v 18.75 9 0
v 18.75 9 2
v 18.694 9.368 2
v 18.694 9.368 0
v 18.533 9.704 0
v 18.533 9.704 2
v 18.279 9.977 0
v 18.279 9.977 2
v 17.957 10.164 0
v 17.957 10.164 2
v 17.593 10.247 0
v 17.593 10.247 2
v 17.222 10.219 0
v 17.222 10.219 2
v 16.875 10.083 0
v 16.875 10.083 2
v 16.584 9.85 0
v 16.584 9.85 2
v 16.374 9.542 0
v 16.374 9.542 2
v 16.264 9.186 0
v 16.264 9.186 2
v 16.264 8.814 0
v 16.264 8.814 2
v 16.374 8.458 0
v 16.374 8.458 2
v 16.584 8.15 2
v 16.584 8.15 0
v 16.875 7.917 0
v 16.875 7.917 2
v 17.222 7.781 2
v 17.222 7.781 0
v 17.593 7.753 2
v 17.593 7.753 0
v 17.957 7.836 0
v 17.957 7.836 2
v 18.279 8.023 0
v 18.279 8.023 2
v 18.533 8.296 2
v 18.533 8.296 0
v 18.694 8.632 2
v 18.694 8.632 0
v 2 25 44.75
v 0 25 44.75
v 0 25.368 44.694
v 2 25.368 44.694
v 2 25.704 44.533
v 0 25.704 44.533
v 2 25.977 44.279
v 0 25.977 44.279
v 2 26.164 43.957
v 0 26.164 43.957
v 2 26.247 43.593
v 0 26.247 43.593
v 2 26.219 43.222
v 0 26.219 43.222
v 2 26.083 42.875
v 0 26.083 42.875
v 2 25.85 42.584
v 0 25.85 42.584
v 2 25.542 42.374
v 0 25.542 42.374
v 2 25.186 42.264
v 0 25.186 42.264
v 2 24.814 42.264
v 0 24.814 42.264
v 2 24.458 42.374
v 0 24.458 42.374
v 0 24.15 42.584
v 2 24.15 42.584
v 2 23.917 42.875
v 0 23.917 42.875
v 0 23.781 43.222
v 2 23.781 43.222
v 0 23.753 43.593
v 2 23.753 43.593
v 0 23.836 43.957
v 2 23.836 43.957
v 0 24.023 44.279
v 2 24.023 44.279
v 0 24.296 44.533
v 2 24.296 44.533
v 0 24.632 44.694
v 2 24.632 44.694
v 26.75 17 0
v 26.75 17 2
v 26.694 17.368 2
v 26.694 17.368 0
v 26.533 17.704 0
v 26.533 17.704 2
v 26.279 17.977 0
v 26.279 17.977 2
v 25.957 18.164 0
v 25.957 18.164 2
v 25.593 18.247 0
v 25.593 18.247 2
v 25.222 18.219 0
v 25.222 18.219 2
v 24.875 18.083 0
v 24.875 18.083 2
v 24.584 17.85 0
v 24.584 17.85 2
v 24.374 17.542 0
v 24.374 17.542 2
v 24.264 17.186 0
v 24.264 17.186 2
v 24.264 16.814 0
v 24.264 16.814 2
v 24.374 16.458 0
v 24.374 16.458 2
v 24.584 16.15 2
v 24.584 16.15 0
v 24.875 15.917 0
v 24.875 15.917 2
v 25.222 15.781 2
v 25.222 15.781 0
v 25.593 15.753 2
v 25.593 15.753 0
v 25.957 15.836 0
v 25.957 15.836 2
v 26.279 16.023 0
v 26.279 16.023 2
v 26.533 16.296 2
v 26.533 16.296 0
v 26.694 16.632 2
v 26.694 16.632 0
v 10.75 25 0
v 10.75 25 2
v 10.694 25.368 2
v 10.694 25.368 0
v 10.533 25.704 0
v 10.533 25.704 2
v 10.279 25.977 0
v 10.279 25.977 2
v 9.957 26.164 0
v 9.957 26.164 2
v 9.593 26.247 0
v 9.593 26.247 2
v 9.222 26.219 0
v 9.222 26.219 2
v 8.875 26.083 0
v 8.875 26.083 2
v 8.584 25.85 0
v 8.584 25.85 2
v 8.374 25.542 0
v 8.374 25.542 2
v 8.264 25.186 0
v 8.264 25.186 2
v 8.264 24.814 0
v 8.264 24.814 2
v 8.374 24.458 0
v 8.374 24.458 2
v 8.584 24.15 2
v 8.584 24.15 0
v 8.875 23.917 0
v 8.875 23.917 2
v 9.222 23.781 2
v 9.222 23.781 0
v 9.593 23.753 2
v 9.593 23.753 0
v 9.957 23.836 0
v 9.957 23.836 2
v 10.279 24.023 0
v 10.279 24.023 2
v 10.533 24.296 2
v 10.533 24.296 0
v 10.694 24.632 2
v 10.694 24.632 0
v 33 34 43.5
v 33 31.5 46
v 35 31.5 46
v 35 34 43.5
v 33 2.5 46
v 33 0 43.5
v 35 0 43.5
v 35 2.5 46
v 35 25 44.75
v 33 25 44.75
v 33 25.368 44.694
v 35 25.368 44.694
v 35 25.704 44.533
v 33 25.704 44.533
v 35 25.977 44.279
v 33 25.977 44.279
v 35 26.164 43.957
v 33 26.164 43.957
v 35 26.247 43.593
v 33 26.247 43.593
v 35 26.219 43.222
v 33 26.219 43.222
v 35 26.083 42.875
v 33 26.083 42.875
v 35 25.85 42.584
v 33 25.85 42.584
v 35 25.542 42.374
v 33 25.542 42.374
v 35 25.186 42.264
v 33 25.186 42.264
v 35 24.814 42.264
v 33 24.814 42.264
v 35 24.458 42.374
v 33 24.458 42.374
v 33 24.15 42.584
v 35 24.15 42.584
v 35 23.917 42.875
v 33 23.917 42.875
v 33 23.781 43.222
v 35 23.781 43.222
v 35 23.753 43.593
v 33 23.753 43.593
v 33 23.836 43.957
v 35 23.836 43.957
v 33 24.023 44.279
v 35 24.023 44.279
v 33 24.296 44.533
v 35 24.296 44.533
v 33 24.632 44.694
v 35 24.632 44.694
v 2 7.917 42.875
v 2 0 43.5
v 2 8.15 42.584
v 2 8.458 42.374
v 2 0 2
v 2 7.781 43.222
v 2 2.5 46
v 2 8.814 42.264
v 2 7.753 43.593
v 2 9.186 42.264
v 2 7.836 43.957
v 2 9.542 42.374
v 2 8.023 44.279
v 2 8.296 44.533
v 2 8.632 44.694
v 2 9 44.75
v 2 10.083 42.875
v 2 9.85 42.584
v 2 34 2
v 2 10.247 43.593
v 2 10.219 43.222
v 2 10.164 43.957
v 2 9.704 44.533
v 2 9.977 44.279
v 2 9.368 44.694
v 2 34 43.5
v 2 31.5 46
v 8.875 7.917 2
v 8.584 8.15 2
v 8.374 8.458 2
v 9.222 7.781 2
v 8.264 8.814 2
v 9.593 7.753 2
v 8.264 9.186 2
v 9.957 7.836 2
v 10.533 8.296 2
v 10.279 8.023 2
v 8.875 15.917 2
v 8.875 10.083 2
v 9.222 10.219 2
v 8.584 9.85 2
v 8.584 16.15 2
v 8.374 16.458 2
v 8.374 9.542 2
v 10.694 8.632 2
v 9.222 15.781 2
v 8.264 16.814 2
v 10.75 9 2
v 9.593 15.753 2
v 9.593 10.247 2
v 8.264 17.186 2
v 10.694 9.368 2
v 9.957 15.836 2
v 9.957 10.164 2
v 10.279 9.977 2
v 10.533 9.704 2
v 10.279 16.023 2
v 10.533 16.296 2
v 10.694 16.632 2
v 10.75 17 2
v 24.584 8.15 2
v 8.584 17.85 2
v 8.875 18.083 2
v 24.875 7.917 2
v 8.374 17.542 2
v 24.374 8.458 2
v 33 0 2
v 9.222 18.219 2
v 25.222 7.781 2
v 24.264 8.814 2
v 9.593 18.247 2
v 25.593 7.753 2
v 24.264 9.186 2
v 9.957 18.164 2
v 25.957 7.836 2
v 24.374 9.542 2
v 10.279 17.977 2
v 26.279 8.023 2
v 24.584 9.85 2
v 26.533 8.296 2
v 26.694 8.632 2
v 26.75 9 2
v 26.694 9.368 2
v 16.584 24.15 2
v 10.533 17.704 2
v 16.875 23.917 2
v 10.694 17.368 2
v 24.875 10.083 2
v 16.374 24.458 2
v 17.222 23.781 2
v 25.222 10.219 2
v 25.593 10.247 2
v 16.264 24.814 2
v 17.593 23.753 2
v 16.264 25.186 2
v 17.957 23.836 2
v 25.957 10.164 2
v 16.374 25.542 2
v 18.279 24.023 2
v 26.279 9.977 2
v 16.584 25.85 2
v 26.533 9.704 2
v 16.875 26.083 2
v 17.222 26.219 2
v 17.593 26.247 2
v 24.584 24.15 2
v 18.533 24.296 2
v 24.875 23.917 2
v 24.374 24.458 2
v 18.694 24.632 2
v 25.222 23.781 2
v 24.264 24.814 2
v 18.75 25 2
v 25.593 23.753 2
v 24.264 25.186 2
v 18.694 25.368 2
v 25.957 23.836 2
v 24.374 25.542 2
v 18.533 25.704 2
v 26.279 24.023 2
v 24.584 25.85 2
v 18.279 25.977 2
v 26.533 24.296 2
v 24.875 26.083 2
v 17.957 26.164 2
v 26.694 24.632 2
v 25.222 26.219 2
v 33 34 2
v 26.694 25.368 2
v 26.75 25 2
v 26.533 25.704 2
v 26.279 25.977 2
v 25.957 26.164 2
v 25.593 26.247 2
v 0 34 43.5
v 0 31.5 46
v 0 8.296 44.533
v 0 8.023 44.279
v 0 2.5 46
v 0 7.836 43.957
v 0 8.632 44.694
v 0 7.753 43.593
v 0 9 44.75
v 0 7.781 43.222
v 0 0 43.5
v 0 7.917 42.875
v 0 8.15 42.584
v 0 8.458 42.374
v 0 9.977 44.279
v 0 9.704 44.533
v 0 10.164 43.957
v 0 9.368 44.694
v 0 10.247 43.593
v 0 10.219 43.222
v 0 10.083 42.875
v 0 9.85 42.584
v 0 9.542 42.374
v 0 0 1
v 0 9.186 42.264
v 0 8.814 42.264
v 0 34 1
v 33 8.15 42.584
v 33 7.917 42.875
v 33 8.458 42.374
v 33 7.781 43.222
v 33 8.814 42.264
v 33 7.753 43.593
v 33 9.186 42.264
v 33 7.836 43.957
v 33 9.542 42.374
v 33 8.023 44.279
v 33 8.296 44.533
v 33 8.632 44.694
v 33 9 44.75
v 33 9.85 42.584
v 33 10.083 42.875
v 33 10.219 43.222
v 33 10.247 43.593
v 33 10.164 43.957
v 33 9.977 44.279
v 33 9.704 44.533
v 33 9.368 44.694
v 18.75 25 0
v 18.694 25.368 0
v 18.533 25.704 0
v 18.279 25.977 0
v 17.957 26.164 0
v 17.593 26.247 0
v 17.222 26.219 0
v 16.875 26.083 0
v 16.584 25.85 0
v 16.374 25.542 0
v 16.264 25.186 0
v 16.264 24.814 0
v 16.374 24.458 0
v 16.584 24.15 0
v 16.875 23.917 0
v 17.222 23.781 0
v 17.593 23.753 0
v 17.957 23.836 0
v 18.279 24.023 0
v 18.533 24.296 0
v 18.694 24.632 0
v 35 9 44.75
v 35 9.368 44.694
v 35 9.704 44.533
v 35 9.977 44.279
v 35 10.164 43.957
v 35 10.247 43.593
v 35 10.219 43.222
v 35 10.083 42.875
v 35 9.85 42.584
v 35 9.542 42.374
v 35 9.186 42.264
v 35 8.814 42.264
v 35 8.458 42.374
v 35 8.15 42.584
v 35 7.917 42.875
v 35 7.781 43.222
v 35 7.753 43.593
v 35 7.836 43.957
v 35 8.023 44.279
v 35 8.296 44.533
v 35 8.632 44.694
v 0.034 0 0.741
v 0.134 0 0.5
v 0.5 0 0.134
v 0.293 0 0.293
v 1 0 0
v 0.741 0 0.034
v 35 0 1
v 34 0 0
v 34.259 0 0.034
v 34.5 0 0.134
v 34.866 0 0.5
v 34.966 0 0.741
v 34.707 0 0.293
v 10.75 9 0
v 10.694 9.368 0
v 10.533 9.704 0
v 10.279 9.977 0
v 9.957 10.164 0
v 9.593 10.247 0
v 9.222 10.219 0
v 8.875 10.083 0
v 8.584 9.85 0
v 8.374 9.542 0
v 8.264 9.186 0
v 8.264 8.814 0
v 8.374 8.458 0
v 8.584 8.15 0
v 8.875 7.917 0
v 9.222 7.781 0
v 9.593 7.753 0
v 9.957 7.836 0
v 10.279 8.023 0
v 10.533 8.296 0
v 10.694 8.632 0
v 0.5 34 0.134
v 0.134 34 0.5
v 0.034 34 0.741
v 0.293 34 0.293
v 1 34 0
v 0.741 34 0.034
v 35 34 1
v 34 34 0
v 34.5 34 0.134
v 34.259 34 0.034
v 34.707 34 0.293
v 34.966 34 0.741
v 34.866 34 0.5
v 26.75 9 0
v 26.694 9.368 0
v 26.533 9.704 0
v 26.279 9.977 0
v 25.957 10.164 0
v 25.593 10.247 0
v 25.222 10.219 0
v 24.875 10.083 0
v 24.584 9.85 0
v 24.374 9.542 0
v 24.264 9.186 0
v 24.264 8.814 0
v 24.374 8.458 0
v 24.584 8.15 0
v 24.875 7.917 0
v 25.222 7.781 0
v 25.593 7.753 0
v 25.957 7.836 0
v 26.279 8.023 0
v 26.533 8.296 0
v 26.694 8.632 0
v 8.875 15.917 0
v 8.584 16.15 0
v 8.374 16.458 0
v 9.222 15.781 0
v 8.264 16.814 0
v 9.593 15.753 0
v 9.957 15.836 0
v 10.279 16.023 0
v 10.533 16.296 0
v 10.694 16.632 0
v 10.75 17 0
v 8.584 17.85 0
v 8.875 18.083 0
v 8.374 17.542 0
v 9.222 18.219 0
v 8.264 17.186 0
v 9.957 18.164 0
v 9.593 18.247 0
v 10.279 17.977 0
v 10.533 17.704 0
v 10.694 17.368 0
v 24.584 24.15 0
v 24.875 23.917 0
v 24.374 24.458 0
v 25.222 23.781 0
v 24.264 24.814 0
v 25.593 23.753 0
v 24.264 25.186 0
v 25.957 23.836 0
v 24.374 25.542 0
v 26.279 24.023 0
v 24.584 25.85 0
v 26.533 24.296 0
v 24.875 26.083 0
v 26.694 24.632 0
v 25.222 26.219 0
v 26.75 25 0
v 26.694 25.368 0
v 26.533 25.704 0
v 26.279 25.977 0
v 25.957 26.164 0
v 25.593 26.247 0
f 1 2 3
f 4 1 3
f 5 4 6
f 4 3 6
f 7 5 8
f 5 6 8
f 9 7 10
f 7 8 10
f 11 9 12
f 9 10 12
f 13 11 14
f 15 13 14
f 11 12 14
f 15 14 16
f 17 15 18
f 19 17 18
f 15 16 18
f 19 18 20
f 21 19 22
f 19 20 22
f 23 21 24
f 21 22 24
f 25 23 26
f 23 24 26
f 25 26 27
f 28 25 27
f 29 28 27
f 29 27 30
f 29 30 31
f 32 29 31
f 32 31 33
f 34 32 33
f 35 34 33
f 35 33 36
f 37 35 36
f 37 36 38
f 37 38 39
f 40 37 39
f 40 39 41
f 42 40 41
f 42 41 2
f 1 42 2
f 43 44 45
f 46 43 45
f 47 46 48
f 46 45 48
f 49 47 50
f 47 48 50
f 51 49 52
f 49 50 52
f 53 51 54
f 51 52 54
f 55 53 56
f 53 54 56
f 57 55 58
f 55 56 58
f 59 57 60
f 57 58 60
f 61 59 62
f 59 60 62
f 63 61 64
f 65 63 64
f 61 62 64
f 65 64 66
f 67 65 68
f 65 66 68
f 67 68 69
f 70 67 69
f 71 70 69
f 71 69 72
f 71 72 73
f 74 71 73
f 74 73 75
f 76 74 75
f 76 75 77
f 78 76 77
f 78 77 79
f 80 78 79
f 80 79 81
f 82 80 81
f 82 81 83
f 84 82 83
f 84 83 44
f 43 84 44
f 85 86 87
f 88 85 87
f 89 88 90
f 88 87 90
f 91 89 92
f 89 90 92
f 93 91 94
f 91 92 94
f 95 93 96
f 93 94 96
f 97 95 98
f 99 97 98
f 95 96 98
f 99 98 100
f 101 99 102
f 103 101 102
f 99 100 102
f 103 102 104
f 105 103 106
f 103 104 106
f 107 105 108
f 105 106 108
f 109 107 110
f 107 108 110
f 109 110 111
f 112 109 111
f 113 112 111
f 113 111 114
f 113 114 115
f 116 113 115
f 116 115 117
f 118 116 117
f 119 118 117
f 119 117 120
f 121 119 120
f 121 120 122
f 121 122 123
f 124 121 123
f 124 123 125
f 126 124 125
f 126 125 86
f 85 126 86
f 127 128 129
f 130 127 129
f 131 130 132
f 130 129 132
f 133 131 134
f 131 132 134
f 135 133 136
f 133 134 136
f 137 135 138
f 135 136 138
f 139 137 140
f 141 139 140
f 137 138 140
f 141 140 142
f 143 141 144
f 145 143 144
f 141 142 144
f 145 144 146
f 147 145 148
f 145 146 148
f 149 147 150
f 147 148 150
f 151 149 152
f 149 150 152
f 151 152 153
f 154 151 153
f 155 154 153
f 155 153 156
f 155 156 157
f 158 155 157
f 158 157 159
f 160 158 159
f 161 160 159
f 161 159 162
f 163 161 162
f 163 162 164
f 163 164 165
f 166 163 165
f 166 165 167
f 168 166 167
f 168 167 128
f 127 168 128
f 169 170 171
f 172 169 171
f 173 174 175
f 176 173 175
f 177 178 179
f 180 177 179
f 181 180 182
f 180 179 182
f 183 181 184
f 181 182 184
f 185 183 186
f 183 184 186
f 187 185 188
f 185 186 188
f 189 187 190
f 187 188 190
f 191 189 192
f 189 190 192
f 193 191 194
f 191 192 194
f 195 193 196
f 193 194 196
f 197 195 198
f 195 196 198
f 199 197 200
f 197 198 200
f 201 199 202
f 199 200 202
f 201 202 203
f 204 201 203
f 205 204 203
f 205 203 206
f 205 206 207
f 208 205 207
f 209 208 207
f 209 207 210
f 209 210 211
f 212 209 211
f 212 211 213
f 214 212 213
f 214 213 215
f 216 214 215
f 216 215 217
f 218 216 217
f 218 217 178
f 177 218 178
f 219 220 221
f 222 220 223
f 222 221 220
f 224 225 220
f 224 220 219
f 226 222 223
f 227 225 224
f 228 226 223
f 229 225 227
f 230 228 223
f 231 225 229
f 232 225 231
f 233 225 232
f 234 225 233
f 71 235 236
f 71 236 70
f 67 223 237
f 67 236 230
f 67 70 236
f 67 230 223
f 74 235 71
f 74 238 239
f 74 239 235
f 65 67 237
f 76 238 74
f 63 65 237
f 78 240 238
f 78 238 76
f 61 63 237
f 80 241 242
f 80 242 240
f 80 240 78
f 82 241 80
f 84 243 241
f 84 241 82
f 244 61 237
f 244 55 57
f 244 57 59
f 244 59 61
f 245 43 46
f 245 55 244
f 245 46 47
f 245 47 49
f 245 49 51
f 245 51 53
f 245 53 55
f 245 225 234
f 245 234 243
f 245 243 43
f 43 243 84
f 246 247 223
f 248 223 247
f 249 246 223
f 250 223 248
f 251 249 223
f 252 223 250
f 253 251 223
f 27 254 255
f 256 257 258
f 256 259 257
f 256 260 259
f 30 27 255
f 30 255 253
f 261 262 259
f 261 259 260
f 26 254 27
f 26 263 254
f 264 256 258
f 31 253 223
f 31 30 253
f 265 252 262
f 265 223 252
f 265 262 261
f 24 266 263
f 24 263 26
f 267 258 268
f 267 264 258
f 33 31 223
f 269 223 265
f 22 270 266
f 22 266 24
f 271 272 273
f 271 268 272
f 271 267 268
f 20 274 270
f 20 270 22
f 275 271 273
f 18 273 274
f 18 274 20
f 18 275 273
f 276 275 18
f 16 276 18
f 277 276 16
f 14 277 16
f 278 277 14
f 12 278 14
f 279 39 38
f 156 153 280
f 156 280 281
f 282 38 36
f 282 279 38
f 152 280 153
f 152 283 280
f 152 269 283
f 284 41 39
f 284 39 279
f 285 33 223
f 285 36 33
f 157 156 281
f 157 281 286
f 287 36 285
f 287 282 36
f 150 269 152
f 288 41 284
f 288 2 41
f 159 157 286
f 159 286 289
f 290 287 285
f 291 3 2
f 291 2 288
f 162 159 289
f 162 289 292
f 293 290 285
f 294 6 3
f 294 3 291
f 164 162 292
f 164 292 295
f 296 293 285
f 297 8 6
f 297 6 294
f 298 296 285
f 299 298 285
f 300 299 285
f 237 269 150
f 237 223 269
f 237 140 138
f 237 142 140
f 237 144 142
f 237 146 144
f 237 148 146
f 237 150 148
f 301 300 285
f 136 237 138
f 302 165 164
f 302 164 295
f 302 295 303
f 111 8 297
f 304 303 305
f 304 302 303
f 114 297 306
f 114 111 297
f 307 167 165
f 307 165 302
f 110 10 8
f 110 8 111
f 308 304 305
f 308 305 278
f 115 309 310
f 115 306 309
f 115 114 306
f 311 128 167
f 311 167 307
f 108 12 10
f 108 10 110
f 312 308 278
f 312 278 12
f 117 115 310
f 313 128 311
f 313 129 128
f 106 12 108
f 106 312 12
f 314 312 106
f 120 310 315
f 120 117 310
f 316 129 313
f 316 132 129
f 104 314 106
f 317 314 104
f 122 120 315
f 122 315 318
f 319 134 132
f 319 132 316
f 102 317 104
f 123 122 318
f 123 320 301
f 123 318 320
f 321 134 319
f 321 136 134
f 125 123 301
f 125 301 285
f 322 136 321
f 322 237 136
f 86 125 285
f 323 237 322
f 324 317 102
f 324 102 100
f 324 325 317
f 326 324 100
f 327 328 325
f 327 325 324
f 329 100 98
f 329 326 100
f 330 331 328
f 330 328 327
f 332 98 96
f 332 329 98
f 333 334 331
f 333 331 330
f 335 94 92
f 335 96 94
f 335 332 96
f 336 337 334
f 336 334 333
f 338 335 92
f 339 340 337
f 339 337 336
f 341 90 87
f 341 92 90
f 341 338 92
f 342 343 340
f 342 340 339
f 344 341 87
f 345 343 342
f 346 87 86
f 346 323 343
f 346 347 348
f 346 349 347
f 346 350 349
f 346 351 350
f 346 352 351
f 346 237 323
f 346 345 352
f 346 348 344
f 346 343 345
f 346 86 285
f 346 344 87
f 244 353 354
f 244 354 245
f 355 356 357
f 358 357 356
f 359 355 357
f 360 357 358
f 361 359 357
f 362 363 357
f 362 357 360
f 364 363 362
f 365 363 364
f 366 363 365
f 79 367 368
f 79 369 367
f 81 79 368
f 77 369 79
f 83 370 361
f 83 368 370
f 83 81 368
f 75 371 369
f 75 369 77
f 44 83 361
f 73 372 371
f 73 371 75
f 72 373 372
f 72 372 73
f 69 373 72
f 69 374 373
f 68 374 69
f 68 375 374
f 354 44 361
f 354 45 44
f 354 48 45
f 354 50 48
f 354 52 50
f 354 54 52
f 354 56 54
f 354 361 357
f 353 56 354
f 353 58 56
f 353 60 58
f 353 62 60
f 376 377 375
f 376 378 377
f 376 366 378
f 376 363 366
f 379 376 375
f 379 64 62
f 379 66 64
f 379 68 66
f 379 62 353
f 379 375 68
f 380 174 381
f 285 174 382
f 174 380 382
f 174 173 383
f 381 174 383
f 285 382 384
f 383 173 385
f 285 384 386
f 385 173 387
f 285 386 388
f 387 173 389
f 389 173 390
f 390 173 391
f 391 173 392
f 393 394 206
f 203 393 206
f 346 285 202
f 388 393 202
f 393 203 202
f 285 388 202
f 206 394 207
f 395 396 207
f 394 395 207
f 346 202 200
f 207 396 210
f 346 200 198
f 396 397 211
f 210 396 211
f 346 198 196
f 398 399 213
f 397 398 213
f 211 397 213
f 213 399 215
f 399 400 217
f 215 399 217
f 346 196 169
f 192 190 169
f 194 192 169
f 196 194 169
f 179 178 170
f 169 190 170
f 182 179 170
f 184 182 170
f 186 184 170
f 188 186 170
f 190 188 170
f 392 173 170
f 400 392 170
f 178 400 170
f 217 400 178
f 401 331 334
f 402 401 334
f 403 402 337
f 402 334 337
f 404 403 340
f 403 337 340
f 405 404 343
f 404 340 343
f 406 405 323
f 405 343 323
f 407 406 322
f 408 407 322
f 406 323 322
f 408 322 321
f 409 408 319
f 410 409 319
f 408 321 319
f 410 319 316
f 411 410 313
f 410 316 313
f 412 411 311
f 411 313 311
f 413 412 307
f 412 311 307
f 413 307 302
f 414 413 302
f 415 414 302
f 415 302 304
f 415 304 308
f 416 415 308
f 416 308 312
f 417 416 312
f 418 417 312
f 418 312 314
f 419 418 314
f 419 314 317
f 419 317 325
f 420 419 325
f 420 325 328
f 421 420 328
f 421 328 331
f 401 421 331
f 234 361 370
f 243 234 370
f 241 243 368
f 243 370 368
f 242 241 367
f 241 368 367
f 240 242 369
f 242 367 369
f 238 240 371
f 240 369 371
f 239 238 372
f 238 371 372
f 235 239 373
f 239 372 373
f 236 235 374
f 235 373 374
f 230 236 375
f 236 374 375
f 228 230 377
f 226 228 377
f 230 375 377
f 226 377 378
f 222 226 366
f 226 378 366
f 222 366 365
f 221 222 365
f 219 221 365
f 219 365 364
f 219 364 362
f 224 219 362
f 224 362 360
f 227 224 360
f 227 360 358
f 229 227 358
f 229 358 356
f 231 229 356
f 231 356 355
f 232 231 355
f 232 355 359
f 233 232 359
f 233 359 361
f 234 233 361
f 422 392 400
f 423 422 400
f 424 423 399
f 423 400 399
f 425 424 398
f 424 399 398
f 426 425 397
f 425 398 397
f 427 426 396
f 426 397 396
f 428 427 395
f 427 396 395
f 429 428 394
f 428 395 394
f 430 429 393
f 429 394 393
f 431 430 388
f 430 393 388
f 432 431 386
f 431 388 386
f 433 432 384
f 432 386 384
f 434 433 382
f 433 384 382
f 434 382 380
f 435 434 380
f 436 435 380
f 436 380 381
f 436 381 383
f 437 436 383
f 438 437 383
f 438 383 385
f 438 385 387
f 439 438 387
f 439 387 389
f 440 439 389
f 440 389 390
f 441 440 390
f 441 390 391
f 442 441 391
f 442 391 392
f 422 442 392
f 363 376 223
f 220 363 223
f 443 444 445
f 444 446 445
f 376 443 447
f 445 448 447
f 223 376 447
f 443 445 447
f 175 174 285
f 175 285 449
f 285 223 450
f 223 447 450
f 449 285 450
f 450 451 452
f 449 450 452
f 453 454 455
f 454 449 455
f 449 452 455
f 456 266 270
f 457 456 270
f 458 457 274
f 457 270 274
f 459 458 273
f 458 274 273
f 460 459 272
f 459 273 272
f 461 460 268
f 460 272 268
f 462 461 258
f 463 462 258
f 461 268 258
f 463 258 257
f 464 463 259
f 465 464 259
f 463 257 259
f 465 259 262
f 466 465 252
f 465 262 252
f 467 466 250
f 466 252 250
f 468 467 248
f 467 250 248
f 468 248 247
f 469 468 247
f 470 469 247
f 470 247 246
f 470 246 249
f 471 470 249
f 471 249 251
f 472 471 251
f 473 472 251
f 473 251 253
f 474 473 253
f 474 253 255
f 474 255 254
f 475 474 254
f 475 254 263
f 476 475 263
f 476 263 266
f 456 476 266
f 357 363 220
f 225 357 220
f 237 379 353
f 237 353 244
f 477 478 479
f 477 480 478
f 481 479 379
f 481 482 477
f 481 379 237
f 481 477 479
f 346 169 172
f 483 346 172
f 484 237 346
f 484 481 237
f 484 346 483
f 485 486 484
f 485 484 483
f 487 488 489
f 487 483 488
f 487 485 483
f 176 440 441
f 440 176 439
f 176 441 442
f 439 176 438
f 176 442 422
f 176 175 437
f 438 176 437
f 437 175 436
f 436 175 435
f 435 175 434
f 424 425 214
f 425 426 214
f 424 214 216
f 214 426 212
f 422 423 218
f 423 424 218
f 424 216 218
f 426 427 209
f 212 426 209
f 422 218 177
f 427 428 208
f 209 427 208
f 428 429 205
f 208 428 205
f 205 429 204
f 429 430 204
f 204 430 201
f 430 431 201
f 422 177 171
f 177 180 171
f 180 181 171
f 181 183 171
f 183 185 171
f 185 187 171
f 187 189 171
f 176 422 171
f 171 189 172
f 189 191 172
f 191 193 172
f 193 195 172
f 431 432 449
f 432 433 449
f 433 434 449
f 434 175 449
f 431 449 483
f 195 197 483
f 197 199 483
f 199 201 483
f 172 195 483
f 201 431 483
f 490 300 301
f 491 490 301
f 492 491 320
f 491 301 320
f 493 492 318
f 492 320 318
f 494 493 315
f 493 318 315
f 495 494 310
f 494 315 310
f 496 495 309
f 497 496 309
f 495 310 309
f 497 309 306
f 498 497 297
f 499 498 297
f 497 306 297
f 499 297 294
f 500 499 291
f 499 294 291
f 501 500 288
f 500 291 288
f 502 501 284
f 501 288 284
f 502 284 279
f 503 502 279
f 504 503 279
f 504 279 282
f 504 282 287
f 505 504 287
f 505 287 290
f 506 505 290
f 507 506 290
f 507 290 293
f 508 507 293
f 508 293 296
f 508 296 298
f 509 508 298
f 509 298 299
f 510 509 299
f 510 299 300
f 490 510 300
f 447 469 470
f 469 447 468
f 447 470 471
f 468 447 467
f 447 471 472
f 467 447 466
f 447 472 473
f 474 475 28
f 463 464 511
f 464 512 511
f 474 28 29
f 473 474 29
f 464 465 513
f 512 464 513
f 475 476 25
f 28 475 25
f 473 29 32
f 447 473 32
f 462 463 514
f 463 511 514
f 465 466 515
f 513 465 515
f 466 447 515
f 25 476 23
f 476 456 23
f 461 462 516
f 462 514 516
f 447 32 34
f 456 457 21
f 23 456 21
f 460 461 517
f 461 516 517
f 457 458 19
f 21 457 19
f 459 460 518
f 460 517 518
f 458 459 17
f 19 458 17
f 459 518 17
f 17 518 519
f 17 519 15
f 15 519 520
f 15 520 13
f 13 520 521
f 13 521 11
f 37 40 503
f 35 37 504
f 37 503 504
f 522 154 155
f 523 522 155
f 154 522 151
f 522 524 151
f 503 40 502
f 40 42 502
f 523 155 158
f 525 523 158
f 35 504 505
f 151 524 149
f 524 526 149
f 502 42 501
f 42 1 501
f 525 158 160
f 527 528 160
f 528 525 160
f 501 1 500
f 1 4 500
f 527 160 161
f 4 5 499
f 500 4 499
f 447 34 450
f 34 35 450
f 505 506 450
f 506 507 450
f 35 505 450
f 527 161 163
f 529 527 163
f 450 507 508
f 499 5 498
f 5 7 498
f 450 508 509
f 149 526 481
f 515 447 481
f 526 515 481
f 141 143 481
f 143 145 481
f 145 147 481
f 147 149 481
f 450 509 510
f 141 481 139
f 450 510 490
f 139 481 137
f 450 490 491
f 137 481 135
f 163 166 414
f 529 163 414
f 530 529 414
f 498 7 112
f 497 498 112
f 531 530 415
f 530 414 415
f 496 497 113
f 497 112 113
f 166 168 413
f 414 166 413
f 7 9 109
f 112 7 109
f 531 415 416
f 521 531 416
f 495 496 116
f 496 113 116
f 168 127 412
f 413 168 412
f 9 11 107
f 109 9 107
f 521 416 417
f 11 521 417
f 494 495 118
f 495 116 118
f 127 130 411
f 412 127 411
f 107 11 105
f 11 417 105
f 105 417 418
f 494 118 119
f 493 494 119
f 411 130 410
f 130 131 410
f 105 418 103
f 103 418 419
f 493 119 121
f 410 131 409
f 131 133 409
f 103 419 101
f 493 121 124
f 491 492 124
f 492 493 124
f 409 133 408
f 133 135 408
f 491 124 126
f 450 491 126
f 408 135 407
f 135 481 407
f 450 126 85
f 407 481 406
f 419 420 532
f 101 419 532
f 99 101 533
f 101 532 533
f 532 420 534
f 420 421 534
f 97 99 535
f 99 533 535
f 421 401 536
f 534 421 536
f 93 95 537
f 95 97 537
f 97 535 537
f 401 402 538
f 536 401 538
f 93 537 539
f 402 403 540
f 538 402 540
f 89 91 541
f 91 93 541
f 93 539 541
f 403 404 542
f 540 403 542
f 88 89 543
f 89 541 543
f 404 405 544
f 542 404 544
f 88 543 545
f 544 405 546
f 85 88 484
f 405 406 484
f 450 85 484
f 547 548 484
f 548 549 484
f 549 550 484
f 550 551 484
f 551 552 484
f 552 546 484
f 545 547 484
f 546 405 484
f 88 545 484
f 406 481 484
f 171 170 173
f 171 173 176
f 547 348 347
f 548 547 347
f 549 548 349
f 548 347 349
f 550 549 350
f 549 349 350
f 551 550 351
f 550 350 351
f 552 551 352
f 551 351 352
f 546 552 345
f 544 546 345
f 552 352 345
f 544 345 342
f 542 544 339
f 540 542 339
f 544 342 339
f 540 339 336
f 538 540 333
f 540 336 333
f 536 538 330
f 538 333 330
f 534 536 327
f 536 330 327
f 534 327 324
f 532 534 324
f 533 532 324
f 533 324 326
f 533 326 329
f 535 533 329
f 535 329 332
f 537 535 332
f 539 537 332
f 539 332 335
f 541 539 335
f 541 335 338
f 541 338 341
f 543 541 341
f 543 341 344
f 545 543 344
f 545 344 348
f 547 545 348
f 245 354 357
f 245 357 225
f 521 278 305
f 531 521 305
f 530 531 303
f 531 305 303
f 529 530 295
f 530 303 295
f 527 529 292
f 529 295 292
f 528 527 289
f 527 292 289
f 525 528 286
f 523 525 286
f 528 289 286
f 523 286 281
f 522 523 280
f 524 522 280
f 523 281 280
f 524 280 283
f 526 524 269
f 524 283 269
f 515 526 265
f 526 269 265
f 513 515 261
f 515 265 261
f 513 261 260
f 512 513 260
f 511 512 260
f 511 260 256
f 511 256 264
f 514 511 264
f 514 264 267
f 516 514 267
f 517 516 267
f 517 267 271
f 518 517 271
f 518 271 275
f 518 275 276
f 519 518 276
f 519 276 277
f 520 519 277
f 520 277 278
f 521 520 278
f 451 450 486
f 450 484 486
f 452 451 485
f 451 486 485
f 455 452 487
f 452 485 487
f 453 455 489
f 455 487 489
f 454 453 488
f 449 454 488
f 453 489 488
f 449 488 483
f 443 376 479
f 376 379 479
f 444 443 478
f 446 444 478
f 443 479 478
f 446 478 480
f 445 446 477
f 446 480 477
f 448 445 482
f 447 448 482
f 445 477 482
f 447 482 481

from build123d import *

# Parameters (mm, degrees)
SKETCH1_W           = 35
SKETCH1_H           = 34
BOSS_EXTRUDE1_DEPTH = 46
SKETCH3_W           = 31
SKETCH3_H           = 34
CUT_EXTRUDE1_DEPTH  = 44
FILLET1_R           = 1
CHAMFER1_SIZE       = 2.5
SKETCH4_R           = 1.25
CUT_EXTRUDE2_DEPTH  = 40.5
SKETCH7_R           = 1.25
CUT_EXTRUDE3_DEPTH  = 5


with BuildPart() as part:
    # Sketch1 → Boss-Extrude1 (new body)
    with BuildSketch(Plane.XY):
        with Locations((17.5, 17)):
            Rectangle(SKETCH1_W, SKETCH1_H)
    extrude(amount=BOSS_EXTRUDE1_DEPTH)

    # Sketch3 → Cut-Extrude1 (cut)
    with BuildSketch(Plane.XY.offset(46)):
        with Locations((17.5, 17)):
            Rectangle(SKETCH3_W, SKETCH3_H)
    extrude(amount=-CUT_EXTRUDE1_DEPTH, mode=Mode.SUBTRACT)

    # Fillet1
    fillet1_edges = [part.edges().sort_by_distance(p)[0] for p in [
        (0, 17, 0),
        (35, 17, 0),
    ]]
    fillet(fillet1_edges, radius=FILLET1_R)

    # Chamfer1
    chamfer1_edges = [part.edges().sort_by_distance(p)[0] for p in [
        (1, 0, 46),
        (1, 34, 46),
        (34, 0, 46),
        (34, 34, 46),
    ]]
    chamfer(chamfer1_edges, length=CHAMFER1_SIZE)

    # Sketch4 → Cut-Extrude2 (cut)
    with BuildSketch(Plane.ZY):
        with Locations((43.5, 25)):
            Circle(SKETCH4_R)
        with Locations((43.5, 9)):
            Circle(SKETCH4_R)
    extrude(amount=-CUT_EXTRUDE2_DEPTH, mode=Mode.SUBTRACT)

    # Sketch7 → Cut-Extrude3 (cut)
    with BuildSketch(Plane.XY.offset(2)):
        with Locations((9.5, 9)):
            Circle(SKETCH7_R)
        with Locations((17.5, 9)):
            Circle(SKETCH7_R)
        with Locations((25.5, 9)):
            Circle(SKETCH7_R)
        with Locations((25.5, 17)):
            Circle(SKETCH7_R)
        with Locations((17.5, 25)):
            Circle(SKETCH7_R)
        with Locations((25.5, 25)):
            Circle(SKETCH7_R)
        with Locations((9.5, 17)):
            Circle(SKETCH7_R)
        with Locations((9.5, 25)):
            Circle(SKETCH7_R)
    extrude(amount=-CUT_EXTRUDE3_DEPTH, mode=Mode.SUBTRACT)


solid = part.part
